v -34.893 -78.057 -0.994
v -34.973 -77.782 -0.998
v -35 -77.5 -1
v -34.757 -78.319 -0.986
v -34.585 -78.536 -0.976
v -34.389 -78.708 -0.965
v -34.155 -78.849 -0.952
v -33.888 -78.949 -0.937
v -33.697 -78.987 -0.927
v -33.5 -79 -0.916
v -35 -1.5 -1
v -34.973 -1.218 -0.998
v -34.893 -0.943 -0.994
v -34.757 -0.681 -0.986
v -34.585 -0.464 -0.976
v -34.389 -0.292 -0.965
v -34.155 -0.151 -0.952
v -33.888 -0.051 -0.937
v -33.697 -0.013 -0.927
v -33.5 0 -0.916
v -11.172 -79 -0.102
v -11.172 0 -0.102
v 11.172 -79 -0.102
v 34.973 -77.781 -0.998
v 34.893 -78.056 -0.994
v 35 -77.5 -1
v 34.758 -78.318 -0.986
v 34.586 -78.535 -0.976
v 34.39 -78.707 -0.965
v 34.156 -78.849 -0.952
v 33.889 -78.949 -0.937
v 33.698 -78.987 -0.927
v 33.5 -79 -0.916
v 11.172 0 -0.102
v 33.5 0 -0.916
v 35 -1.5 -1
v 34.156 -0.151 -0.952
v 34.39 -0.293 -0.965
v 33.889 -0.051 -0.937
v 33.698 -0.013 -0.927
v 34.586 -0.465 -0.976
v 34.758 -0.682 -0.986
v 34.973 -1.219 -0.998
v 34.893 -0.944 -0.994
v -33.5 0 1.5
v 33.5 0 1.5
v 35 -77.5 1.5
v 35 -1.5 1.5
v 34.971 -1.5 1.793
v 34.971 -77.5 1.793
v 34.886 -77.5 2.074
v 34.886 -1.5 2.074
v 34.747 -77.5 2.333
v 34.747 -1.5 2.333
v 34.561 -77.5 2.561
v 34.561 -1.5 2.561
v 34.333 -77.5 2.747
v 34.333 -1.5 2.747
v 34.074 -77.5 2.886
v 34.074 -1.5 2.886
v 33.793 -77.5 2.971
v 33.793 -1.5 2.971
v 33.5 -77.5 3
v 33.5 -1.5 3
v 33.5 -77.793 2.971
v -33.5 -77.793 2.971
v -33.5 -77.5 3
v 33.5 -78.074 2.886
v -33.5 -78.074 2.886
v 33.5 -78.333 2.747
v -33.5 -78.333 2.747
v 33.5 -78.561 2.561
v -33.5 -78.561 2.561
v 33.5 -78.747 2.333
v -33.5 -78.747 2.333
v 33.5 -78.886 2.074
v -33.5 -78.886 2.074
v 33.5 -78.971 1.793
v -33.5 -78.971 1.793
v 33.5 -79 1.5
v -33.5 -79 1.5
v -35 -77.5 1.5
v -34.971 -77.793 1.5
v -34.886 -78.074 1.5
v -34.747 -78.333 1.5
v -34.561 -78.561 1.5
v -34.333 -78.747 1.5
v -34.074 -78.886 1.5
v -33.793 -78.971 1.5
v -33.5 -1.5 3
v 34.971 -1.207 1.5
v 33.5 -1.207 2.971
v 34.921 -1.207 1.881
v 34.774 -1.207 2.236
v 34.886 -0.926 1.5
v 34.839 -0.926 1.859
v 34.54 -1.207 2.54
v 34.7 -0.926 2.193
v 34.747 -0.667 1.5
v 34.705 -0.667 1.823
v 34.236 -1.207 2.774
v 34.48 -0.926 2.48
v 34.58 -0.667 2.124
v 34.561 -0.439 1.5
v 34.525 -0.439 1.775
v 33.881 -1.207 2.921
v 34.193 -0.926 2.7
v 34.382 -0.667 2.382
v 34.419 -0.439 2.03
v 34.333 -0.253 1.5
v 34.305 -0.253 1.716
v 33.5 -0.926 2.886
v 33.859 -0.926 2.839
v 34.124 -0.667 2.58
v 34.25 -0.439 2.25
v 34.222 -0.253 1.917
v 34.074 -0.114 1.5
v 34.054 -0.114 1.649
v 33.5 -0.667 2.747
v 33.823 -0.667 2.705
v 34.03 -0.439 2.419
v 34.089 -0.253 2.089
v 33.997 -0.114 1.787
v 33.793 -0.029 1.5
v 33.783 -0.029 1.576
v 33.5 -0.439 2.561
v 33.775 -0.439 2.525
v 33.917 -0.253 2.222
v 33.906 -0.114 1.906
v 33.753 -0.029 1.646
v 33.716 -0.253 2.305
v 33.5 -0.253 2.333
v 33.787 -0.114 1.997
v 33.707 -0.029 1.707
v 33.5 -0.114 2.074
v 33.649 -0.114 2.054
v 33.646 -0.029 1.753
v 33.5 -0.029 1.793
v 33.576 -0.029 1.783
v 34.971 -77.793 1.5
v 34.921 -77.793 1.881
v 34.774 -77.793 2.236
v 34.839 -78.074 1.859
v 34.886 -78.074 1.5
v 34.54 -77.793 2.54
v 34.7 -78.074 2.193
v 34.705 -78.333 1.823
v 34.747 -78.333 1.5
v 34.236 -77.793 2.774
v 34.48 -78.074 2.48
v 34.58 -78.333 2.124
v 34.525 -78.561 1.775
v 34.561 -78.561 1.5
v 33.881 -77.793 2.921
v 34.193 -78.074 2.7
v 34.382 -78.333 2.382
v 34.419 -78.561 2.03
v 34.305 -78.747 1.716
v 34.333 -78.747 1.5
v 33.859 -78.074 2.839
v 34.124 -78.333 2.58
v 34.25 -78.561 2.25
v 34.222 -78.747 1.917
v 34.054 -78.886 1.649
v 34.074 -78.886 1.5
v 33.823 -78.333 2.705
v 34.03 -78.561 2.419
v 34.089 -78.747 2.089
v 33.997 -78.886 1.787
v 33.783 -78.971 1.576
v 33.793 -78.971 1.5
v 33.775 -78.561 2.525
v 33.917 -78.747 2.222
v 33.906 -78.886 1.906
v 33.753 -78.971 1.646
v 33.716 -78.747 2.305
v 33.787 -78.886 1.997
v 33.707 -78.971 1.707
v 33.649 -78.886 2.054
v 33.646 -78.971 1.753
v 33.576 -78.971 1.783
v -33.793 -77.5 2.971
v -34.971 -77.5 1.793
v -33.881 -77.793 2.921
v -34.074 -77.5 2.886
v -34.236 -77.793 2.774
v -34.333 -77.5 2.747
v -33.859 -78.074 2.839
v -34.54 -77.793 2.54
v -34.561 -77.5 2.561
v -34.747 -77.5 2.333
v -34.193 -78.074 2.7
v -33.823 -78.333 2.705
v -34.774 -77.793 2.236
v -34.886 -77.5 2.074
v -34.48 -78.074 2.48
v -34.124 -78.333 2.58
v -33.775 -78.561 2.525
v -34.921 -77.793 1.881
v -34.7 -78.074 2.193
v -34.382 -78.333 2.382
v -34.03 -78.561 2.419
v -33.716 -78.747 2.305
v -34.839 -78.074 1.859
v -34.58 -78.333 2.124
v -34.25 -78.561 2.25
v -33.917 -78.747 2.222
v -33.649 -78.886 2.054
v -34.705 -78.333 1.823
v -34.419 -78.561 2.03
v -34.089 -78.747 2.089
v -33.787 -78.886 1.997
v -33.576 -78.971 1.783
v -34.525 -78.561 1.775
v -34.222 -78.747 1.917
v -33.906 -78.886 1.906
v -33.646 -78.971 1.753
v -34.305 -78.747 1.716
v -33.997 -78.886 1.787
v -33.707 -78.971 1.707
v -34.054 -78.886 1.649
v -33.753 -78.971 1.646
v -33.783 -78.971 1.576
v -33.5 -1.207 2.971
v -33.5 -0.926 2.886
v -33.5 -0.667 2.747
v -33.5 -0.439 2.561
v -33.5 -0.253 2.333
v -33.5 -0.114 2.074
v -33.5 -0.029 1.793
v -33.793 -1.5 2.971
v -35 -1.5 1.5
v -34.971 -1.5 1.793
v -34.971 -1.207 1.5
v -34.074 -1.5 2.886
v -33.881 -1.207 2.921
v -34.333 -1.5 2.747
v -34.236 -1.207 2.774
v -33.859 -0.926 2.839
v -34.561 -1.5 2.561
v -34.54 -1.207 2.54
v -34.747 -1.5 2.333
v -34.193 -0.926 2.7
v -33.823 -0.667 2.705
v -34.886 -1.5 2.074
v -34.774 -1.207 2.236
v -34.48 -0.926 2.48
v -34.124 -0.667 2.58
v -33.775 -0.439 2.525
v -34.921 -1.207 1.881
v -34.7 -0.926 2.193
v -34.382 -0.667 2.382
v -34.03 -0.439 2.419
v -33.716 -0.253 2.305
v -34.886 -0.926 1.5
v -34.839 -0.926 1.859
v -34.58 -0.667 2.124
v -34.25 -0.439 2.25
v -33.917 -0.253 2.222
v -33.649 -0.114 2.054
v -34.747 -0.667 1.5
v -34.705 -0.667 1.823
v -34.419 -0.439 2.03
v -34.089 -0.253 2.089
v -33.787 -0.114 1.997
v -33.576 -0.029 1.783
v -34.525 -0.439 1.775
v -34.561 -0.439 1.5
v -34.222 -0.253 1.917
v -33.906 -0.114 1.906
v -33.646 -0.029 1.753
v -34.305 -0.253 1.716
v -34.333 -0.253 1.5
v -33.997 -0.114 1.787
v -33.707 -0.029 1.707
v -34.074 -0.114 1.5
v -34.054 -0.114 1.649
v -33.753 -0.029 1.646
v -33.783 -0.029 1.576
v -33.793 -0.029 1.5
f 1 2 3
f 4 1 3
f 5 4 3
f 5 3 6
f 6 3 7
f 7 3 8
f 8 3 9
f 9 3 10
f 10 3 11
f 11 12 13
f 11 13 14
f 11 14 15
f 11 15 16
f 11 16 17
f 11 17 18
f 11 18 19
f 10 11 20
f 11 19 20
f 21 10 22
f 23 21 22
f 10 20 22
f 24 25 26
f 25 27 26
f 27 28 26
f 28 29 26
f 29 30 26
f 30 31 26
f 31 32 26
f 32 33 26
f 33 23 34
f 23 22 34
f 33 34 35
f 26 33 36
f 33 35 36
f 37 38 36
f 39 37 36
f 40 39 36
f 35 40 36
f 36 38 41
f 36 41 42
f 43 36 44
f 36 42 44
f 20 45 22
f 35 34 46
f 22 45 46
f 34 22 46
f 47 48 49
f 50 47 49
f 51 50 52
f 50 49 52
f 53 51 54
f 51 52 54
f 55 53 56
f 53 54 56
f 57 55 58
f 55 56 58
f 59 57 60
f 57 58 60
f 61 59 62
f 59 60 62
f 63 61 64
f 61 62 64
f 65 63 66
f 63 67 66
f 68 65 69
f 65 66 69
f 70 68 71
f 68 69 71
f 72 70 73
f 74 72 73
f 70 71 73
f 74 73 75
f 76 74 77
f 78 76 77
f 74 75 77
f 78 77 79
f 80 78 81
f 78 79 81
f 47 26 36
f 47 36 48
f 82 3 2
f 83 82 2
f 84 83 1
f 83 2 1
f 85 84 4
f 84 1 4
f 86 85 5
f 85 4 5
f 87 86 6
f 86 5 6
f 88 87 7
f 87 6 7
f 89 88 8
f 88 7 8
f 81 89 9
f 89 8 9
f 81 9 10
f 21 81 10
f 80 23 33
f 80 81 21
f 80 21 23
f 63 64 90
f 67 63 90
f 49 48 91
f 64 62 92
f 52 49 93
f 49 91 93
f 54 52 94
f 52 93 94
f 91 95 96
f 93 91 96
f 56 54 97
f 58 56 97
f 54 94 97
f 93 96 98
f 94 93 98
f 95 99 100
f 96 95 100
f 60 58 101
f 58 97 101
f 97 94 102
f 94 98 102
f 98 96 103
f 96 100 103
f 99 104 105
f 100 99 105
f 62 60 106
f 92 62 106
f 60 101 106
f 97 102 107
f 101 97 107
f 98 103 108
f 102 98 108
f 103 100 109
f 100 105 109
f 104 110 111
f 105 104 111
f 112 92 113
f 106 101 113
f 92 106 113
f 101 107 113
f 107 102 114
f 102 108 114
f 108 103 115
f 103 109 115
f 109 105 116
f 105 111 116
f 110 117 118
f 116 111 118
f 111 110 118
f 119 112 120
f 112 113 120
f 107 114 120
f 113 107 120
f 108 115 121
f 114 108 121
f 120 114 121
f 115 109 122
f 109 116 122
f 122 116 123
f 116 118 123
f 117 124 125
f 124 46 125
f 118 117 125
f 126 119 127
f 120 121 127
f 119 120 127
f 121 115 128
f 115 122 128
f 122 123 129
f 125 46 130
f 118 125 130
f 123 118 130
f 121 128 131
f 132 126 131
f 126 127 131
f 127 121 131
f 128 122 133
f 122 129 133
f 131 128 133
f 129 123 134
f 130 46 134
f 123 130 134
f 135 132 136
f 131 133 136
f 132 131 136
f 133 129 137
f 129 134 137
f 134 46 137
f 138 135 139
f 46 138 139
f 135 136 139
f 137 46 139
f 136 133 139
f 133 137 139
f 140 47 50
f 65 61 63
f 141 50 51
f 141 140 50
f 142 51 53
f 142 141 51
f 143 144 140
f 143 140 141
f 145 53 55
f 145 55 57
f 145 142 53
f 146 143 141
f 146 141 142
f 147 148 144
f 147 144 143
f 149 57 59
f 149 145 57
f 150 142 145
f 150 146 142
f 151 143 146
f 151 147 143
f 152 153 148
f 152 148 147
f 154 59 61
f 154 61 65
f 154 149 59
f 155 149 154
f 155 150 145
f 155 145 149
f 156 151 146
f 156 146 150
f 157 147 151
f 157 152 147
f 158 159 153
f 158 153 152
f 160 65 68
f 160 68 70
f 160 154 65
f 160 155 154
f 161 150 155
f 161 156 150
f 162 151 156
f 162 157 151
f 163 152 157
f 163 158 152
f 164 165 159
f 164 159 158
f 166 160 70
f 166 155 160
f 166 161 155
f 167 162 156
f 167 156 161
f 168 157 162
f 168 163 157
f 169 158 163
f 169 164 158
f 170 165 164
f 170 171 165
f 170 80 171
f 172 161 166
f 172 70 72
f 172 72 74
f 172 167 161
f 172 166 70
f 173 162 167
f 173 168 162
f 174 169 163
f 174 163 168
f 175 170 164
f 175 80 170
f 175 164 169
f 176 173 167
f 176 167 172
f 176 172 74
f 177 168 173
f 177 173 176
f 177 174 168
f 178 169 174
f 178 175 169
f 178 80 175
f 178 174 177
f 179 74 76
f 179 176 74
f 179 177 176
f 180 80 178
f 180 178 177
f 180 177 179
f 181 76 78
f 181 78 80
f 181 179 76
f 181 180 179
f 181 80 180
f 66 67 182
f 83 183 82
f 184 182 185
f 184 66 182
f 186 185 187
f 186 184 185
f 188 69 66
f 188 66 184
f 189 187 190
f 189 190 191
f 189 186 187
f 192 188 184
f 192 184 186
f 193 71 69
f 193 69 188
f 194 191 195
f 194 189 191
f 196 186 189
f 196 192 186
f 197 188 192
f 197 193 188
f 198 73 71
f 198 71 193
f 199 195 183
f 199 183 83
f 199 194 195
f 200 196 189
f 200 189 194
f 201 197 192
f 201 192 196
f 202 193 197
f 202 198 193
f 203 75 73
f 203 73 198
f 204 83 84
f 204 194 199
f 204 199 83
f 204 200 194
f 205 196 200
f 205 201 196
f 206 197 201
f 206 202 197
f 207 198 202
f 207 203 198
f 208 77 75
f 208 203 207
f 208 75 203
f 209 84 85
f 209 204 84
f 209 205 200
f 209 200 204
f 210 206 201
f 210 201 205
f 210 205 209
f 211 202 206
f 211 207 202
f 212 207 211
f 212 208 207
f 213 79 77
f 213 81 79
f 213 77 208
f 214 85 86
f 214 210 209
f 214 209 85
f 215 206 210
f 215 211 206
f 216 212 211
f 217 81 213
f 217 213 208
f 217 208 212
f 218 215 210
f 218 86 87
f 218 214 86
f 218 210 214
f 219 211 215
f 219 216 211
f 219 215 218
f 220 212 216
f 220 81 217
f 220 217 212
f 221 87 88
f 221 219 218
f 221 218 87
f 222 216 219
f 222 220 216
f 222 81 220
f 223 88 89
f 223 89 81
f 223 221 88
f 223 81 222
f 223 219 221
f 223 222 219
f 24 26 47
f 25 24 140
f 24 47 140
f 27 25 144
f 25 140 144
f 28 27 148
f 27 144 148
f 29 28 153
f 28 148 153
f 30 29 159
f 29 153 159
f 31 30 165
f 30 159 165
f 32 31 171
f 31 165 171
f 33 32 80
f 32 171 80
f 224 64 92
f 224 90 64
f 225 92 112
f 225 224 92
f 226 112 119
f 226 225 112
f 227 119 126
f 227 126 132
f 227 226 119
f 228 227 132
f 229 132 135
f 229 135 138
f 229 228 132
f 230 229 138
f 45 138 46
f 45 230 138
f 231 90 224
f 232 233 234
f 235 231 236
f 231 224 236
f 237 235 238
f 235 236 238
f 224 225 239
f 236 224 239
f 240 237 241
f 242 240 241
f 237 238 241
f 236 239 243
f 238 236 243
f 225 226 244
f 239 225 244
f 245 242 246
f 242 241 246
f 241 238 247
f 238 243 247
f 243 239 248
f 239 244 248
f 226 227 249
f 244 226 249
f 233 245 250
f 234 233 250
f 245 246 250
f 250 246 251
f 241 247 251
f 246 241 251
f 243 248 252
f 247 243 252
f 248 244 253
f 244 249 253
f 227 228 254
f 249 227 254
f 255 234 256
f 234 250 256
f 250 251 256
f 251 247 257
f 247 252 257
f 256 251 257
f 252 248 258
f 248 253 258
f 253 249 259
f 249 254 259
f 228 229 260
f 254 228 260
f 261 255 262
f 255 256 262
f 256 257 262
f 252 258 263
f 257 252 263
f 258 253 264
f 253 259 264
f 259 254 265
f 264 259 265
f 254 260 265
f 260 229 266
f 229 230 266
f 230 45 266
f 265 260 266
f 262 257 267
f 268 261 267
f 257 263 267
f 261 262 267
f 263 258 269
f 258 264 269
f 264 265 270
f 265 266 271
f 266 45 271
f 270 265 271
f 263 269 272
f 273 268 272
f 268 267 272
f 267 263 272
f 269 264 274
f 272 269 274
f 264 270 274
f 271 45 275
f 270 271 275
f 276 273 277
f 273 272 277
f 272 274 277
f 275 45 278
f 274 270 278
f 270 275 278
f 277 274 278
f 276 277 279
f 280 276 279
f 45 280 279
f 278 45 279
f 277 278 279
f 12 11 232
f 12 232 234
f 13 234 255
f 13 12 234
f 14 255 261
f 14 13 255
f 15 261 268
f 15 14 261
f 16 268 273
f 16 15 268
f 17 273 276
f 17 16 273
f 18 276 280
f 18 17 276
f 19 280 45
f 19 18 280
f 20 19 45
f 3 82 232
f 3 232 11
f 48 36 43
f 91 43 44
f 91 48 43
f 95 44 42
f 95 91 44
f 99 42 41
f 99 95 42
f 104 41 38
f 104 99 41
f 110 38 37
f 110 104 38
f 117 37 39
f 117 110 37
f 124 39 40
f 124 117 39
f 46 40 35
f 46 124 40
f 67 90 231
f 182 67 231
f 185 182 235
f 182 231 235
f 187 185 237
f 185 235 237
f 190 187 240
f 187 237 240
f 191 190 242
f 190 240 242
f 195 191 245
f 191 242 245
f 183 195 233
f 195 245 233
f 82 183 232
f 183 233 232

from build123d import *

# Parameters (mm, degrees)
F1_DEPTH = 79
F2_R     = 1.5


with BuildPart() as f1:
    # F0 (on Front) → F1 (new body)
    with BuildSketch(Plane.XZ):
        with BuildLine():
            Line((33.5, 3), (-33.5, 3))
            ThreePointArc((-33.5, 3), (-34.56066, 2.56066), (-35, 1.5))
            Line((-35, 1.5), (-35, -1))
            ThreePointArc((-35, -1), (0, 0), (35, -1))
            Line((35, -1), (35, 1.5))
            ThreePointArc((35, 1.5), (34.56066, 2.56066), (33.5, 3))
        make_face()
    extrude(amount=F1_DEPTH)

    # F2
    f2_edges = [f1.edges().sort_by_distance(p)[0] for p in [
        (33.5, -39.5, 3),
        (35, -39.5, 1.5),
        (34.56066, 0, 2.56066),
        (34.56066, -79, 2.56066),
    ]]
    fillet(f2_edges, radius=F2_R)


solid = f1.part
